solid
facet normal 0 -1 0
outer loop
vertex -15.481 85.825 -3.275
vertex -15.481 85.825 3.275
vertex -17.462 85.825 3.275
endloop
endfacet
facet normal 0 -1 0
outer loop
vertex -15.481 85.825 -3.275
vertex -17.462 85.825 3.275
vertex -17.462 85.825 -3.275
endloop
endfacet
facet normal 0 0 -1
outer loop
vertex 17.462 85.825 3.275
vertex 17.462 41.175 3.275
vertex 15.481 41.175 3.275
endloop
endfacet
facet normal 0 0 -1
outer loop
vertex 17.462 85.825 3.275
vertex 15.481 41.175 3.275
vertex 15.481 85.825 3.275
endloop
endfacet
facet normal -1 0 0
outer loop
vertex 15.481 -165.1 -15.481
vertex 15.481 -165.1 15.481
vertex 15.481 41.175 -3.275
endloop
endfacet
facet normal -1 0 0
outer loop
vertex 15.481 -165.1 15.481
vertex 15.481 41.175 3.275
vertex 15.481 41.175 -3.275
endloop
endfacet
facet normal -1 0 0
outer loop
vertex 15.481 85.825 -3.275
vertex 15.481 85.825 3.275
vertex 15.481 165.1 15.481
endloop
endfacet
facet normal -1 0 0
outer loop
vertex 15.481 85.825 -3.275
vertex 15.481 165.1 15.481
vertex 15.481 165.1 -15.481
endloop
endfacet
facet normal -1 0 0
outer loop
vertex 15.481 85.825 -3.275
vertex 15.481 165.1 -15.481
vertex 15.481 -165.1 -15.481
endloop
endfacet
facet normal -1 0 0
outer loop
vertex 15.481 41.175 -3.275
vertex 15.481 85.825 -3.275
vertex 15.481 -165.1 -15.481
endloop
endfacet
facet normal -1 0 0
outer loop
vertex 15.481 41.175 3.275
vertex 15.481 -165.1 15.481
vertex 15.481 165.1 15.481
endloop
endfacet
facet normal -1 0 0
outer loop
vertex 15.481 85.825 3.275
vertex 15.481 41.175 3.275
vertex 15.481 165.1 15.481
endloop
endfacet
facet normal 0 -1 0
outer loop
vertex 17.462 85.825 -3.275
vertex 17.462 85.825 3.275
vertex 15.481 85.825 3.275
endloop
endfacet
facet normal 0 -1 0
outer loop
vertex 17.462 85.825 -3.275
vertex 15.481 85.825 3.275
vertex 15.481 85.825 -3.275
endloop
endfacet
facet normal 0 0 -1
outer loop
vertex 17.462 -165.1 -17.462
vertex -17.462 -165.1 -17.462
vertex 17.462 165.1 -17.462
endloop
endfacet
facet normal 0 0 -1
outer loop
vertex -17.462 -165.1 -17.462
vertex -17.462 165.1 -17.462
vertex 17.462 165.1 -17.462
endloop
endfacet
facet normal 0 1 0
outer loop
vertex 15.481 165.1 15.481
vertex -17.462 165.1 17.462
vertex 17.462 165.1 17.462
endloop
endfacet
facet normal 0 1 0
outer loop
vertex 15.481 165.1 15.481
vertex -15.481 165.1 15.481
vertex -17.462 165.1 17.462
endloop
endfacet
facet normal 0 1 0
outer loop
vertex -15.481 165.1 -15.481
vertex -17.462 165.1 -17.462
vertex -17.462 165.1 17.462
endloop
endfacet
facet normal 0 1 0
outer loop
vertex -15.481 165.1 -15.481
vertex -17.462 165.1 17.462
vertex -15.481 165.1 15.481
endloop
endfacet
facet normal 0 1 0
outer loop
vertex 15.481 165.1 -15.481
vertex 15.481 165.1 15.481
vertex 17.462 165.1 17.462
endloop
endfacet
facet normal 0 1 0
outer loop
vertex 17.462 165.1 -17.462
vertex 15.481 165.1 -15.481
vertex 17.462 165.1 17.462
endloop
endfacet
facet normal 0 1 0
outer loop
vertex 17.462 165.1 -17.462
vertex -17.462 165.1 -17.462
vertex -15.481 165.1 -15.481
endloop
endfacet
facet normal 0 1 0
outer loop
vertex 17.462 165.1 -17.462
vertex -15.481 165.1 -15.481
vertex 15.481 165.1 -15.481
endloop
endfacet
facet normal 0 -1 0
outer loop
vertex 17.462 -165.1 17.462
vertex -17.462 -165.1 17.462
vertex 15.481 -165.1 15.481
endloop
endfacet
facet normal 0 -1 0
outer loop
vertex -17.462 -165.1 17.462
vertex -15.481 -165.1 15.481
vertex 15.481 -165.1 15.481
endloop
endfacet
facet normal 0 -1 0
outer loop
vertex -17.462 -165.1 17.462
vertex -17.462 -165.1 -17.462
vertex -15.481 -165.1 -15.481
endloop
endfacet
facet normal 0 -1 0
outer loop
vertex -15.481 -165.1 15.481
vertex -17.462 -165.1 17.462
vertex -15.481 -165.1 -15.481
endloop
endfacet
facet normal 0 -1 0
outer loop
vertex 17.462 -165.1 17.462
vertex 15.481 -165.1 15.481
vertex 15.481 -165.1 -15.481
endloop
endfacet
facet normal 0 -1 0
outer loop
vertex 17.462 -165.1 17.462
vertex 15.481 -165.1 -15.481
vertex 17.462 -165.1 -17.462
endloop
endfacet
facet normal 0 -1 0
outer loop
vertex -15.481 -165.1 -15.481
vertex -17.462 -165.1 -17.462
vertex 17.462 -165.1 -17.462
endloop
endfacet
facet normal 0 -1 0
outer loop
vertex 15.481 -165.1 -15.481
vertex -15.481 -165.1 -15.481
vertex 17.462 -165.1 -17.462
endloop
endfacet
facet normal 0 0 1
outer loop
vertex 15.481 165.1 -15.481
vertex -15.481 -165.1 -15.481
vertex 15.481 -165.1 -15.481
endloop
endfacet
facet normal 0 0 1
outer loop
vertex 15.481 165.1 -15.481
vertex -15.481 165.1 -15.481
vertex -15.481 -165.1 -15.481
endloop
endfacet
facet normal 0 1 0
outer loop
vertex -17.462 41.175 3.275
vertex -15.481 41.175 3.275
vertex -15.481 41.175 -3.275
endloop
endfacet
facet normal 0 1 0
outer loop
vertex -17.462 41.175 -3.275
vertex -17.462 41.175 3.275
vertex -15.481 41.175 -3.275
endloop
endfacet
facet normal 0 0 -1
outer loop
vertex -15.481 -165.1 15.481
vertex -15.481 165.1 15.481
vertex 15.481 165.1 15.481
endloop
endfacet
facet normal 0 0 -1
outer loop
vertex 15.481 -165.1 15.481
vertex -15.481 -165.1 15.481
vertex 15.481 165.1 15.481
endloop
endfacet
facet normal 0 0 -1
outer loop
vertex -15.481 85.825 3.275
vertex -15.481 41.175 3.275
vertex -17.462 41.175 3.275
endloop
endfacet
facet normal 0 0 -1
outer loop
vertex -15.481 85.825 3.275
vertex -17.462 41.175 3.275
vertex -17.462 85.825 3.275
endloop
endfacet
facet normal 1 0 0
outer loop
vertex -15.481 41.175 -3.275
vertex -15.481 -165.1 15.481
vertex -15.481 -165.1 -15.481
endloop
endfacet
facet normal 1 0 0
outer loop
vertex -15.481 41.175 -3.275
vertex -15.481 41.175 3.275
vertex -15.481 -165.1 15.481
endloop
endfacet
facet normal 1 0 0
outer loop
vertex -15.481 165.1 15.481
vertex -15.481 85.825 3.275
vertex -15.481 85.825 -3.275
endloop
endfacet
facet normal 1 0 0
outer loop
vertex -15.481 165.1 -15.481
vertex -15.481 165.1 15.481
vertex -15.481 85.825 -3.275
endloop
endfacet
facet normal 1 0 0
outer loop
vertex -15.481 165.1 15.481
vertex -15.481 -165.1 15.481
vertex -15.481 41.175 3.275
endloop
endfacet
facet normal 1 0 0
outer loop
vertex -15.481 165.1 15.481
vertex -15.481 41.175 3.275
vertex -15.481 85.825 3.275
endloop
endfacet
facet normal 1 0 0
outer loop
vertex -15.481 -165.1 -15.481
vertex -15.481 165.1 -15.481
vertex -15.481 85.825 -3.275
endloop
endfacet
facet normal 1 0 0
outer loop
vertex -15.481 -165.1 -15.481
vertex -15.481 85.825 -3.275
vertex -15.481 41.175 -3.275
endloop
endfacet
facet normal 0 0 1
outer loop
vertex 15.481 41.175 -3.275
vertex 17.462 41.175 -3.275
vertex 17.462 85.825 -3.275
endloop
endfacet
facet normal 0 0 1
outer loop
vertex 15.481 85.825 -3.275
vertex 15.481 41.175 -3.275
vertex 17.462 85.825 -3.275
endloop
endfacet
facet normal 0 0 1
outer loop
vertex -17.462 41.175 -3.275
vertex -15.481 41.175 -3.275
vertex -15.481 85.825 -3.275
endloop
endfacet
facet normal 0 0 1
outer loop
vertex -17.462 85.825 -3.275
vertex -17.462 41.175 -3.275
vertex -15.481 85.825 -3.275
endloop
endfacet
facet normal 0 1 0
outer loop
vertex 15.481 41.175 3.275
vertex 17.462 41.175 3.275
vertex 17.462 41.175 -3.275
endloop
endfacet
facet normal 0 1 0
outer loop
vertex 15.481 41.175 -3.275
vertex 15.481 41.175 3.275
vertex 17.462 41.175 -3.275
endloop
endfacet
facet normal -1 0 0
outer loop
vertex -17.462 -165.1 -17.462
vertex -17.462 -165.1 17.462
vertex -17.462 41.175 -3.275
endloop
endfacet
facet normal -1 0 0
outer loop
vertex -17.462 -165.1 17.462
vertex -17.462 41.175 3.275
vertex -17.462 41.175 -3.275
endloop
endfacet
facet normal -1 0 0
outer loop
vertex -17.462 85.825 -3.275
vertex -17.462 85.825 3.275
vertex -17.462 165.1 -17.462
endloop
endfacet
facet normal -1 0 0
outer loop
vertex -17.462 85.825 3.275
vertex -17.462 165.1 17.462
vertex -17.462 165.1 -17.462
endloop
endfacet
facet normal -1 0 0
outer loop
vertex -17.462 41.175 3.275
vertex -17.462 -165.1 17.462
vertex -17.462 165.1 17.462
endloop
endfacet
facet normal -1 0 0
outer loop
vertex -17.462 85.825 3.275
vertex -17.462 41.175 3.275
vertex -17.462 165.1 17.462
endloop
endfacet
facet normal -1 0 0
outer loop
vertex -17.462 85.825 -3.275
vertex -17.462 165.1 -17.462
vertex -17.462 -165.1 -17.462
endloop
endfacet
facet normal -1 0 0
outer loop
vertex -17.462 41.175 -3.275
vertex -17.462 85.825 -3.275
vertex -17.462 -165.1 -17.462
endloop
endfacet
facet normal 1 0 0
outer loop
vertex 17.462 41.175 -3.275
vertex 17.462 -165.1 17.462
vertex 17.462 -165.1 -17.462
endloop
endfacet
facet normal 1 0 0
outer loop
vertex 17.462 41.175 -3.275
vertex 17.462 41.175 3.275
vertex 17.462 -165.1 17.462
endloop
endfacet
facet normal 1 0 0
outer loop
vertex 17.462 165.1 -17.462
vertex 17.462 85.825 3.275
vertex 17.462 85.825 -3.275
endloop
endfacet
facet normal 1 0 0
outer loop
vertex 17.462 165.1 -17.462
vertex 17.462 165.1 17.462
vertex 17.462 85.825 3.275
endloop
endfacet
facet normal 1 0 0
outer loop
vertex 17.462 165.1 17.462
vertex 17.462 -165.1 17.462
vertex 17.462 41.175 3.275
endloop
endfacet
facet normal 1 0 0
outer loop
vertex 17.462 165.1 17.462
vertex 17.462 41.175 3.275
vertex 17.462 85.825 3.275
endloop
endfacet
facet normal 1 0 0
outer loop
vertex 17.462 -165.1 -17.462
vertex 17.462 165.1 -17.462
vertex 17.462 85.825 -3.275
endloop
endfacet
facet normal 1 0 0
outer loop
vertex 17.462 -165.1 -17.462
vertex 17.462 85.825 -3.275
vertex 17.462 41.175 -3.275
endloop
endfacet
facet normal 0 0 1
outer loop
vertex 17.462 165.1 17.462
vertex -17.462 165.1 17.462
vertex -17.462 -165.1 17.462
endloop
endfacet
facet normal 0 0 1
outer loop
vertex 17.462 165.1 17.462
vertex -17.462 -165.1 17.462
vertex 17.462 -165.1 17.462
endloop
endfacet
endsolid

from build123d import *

# Parameters (mm, degrees)
SKETCH1_W           = 34.925
SKETCH1_H           = 34.925
SKETCH1_W_2         = 30.9626
SKETCH1_H_2         = 30.9626
BOSS_EXTRUDE1_DEPTH = 165.1
SKETCH2_W           = 6.550000108
SKETCH2_H           = 44.650000108
CUT_EXTRUDE1_DEPTH  = 170.654662569


with BuildPart() as part:
    # Sketch1 → Boss-Extrude1 (new, symmetric)
    with BuildSketch(Plane(origin=(0, 0, 0), x_dir=(1, 0, 0), z_dir=(0, 1, 0))):
        Rectangle(SKETCH1_W, SKETCH1_H)
        Rectangle(SKETCH1_W_2, SKETCH1_H_2, mode=Mode.SUBTRACT)
    extrude(amount=BOSS_EXTRUDE1_DEPTH, both=True)

    # Sketch2 → Cut-Extrude1 (cut, through all)
    with BuildSketch(Plane(origin=(17.4625, 0, 0), x_dir=(0, 0, -1), z_dir=(1, 0, 0))):
        with Locations((0, 63.5)):
            Rectangle(SKETCH2_W, SKETCH2_H)
    extrude(amount=-CUT_EXTRUDE1_DEPTH, mode=Mode.SUBTRACT)


solid = part.part
